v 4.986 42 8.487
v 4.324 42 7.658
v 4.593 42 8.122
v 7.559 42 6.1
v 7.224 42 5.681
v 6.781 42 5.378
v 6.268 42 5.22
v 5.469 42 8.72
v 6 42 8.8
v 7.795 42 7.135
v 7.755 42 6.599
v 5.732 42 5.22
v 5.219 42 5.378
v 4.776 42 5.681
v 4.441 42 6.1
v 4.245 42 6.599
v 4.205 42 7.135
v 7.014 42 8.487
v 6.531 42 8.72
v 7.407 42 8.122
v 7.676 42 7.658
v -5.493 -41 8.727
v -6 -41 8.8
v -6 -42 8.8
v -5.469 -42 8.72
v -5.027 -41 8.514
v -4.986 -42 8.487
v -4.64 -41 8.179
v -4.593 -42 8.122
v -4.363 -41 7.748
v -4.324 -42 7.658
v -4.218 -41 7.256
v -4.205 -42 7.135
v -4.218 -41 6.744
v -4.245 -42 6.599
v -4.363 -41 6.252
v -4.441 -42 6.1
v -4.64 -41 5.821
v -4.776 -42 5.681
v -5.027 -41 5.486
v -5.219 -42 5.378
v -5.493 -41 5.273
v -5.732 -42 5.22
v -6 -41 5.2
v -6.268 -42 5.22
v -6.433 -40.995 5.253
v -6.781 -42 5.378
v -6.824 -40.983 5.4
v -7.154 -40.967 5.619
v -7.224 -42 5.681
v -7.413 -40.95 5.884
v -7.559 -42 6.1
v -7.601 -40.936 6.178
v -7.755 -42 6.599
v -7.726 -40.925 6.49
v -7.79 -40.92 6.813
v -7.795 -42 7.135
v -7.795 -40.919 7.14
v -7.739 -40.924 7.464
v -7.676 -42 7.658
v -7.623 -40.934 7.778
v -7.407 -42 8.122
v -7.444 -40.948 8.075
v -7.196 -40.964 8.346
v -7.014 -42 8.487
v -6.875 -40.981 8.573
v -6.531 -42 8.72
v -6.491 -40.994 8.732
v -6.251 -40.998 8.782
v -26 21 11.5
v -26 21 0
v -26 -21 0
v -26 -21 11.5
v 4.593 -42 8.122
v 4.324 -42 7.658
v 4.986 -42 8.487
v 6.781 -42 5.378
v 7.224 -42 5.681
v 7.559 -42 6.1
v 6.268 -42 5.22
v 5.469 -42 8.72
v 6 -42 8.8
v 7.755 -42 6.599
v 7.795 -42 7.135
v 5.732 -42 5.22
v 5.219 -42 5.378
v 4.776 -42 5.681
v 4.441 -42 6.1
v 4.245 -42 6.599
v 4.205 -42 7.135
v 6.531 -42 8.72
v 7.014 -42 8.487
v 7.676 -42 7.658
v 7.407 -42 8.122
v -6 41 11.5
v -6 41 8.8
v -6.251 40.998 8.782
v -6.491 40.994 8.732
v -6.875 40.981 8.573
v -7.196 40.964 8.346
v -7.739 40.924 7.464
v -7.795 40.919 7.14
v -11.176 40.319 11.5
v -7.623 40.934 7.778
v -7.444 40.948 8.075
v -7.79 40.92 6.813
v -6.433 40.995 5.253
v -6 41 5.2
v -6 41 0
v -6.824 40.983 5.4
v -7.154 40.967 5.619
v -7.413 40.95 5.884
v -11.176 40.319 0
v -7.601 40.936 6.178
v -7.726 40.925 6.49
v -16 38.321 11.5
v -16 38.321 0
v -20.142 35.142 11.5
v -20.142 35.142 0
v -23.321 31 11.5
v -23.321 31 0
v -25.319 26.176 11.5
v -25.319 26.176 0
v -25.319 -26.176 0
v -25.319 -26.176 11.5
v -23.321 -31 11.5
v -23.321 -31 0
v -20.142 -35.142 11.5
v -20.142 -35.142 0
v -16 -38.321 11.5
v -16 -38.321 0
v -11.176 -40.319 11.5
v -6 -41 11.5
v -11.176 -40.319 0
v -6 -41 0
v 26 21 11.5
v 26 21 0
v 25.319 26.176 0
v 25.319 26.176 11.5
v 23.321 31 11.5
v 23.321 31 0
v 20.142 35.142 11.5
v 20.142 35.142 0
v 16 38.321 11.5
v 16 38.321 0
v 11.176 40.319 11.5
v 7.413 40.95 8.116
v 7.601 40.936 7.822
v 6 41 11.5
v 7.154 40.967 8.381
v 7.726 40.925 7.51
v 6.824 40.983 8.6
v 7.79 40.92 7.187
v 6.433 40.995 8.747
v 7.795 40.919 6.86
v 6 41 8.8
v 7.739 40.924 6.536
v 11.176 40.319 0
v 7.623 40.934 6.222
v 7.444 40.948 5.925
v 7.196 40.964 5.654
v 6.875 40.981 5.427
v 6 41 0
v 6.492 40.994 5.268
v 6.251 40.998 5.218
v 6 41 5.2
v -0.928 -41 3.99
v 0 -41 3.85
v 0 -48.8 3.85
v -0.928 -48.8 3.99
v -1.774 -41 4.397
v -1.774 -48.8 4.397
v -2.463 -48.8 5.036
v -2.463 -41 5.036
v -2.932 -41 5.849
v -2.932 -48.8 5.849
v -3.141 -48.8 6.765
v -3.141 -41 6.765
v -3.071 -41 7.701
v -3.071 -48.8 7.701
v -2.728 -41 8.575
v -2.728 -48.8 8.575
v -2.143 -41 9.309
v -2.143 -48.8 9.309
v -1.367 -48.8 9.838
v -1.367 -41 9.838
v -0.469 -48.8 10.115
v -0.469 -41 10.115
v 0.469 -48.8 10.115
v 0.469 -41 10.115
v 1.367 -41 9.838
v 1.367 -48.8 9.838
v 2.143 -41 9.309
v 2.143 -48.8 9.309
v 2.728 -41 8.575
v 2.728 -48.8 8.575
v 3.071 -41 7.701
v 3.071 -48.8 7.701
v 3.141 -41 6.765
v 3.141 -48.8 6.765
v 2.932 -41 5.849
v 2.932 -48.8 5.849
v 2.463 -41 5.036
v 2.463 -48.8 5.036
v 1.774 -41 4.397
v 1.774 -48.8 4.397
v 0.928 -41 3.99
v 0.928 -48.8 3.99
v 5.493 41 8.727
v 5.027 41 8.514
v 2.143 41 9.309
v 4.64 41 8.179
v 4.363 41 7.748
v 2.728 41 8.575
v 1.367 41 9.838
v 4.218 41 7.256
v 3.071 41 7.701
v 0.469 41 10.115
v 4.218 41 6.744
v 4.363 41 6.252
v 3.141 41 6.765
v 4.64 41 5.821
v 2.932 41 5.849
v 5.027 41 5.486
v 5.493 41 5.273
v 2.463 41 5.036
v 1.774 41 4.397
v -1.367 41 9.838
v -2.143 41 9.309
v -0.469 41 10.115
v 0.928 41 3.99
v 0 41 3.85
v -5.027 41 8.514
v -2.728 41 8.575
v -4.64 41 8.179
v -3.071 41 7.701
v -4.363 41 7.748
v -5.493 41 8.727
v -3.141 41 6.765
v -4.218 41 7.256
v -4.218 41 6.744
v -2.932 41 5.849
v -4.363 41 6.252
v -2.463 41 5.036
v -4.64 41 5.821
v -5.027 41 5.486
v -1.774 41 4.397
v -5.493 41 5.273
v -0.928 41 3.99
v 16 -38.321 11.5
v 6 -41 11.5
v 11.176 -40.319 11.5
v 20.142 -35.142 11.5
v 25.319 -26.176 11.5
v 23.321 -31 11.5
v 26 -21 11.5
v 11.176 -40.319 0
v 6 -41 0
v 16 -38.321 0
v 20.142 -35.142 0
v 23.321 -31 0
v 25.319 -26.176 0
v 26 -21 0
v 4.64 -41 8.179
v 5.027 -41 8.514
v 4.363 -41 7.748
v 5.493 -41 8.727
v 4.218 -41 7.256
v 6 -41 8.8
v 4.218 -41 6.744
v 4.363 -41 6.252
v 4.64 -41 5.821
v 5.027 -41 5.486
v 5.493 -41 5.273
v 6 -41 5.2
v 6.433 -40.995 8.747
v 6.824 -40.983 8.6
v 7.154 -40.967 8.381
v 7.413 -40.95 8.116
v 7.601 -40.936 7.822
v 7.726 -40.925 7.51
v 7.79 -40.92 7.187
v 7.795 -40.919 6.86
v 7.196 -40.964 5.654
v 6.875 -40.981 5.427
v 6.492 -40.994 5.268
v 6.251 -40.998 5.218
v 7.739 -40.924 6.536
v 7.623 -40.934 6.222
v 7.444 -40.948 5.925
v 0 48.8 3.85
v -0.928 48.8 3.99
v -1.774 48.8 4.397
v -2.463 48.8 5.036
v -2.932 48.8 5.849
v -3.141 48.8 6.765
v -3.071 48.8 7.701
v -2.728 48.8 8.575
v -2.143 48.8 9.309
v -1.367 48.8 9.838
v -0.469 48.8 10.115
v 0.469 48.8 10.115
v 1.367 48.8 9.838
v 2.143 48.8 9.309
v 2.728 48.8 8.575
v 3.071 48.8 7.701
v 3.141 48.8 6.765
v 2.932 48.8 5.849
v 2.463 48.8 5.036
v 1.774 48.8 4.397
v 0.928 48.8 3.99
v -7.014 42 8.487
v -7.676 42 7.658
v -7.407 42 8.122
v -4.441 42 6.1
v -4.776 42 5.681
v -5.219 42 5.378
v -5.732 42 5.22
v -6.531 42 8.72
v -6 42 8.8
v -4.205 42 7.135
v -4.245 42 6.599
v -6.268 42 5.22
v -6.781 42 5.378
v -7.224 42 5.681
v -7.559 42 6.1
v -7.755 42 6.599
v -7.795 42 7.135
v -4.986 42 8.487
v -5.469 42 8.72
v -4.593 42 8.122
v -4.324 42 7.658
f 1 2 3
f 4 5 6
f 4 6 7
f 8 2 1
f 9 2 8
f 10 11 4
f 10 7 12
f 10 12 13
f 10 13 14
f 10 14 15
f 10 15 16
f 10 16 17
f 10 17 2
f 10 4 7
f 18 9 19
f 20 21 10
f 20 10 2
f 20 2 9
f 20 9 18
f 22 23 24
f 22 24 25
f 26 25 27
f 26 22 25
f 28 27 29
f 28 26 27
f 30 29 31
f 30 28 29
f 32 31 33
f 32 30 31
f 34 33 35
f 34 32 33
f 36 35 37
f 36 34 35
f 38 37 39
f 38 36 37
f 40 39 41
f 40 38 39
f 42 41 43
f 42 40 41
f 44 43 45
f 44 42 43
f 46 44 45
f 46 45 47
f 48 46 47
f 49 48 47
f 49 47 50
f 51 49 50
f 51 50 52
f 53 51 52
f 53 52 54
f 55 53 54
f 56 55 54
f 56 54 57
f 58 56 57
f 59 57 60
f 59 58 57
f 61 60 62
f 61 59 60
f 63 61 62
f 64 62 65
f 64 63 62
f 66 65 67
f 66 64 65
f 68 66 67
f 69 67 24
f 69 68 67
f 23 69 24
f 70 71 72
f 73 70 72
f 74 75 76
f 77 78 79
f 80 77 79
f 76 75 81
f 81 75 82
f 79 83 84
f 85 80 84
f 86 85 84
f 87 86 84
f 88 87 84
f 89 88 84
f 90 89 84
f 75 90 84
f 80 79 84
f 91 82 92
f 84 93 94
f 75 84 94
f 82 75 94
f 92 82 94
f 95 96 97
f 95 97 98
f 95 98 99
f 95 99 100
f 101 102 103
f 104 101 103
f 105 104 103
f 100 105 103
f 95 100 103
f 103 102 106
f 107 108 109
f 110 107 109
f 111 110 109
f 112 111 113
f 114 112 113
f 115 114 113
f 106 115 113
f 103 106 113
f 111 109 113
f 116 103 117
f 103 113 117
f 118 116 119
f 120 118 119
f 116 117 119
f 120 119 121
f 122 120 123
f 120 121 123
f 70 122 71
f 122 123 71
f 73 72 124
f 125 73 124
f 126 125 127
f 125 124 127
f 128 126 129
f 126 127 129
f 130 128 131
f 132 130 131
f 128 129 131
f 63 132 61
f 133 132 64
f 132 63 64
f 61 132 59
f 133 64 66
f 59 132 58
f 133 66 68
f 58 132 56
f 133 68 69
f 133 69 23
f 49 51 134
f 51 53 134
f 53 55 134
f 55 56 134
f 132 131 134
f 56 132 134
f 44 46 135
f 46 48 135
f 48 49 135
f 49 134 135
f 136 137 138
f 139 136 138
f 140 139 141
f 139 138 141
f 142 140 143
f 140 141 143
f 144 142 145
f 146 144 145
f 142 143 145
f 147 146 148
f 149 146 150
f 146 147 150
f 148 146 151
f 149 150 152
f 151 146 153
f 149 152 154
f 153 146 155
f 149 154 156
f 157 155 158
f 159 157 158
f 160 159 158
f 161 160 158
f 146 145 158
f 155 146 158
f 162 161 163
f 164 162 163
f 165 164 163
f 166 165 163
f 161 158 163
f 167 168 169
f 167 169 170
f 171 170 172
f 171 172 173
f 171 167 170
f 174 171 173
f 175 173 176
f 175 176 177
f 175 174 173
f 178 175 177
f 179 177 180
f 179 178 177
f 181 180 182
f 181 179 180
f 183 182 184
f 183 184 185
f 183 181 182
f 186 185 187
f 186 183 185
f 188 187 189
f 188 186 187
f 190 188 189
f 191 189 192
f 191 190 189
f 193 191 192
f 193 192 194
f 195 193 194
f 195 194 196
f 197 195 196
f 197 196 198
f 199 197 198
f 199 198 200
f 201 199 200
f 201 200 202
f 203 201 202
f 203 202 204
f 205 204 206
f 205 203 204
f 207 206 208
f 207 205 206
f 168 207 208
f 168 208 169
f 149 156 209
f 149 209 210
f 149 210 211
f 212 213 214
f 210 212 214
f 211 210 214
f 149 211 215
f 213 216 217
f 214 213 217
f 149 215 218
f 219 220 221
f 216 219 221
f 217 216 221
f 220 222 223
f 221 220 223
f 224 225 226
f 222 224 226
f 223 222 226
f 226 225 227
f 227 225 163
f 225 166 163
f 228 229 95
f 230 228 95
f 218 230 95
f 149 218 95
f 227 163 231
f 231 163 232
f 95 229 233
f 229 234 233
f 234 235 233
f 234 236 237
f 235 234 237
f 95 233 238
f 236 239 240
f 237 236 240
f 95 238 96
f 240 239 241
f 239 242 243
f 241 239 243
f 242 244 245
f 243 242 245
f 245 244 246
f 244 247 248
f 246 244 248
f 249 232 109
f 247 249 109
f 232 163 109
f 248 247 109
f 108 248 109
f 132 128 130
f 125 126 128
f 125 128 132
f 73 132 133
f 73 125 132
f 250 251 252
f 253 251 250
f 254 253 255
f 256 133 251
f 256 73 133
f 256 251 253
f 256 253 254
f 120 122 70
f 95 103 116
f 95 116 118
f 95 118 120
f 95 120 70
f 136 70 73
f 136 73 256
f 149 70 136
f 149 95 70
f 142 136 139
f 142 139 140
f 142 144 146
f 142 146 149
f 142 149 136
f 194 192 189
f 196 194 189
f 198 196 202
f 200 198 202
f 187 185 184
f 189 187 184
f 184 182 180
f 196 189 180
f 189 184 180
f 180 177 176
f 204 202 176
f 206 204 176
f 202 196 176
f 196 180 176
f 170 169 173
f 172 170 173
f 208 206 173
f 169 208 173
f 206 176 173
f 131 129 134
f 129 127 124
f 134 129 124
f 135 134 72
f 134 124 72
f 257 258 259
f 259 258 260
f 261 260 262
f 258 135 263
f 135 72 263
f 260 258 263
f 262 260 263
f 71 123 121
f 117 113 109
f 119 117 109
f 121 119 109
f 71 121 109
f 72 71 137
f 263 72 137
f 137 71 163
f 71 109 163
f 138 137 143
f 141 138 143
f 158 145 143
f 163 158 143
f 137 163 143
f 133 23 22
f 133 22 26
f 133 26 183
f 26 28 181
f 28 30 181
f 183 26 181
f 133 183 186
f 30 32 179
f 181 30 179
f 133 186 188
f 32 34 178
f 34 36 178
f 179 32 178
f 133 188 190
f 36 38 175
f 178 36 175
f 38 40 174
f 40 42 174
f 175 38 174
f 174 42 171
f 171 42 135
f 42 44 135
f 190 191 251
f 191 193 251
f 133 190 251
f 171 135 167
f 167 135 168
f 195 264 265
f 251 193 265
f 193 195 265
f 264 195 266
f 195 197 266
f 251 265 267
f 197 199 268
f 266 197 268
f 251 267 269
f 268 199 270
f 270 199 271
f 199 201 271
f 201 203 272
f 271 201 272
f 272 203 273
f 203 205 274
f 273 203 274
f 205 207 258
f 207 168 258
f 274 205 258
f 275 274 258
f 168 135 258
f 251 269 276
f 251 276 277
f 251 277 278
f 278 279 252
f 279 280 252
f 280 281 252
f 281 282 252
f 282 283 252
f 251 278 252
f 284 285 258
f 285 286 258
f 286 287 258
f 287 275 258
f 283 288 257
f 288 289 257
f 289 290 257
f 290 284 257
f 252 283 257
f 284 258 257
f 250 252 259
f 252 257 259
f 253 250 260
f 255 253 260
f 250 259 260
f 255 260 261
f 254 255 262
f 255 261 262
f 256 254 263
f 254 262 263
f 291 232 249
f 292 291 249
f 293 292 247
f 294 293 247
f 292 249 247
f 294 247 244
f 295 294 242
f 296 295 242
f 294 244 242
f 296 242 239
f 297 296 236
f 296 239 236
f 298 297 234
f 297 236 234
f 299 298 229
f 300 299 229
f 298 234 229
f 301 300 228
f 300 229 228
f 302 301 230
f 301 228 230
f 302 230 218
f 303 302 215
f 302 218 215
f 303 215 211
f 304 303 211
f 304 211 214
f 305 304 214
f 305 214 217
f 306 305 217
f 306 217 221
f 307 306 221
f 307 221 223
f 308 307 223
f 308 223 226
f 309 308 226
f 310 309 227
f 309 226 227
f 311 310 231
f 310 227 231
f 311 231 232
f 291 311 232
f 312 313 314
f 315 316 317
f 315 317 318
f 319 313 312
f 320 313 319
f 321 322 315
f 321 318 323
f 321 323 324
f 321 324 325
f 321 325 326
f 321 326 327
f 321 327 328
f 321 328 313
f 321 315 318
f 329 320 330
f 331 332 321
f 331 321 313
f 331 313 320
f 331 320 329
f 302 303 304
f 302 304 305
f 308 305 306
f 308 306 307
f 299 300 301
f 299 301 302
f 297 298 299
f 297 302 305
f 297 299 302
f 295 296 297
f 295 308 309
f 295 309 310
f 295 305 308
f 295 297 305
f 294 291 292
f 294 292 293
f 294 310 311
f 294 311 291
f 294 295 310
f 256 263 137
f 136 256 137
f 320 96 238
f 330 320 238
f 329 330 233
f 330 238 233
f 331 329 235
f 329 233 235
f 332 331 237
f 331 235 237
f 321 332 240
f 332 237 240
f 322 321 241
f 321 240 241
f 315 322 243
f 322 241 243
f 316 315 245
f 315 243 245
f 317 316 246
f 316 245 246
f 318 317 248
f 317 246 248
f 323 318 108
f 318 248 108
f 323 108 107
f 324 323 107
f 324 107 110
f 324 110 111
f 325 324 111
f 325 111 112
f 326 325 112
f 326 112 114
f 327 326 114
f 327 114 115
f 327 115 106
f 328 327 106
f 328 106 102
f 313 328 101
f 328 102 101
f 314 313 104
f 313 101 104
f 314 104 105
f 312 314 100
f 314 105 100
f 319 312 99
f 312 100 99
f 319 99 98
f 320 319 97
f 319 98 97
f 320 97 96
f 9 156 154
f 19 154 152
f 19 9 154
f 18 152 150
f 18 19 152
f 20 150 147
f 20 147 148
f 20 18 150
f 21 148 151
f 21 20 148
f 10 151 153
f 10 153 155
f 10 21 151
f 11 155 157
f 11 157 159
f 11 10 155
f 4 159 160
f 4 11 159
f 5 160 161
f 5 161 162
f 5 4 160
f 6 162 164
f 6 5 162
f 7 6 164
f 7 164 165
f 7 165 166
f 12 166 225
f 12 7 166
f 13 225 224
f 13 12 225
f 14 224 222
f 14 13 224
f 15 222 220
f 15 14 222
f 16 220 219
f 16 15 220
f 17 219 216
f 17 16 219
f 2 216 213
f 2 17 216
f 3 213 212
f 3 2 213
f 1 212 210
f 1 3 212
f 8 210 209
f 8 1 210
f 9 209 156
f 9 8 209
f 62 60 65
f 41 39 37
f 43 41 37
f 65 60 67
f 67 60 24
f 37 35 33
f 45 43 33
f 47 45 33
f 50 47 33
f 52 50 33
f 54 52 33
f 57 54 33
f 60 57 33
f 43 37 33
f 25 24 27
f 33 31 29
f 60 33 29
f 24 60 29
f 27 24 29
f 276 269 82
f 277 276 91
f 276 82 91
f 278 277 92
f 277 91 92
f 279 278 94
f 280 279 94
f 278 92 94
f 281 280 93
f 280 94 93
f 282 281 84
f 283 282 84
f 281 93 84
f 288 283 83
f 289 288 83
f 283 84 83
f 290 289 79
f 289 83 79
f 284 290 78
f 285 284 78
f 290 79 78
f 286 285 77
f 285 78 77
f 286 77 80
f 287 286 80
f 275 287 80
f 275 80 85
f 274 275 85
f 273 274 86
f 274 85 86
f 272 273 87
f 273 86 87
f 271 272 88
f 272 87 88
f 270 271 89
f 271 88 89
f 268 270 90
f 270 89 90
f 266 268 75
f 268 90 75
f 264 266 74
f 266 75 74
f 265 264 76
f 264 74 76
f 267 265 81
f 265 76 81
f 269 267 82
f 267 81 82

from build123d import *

# Parameters (mm, degrees)
BOSS_EXTRUDE1_DEPTH = 11.5
SKETCH2_R           = 3.15
BOSS_EXTRUDE2_DEPTH = 7.8
SKETCH3_R           = 1.8
BOSS_EXTRUDE3_DEPTH = 1


with BuildPart() as part:
    # Sketch1 → Boss-Extrude1 (new body)
    with BuildSketch(Plane.XY):
        with BuildLine():
            Line((-26, 21), (-26, -21))
            ThreePointArc((-26, -21), (-20.142135624, -35.142135624), (-6, -41))
            Line((-6, -41), (6, -41))
            ThreePointArc((6, -41), (20.142135624, -35.142135624), (26, -21))
            Line((26, -21), (26, 21))
            ThreePointArc((26, 21), (20.142135624, 35.142135624), (6, 41))
            Line((6, 41), (-6, 41))
            ThreePointArc((-6, 41), (-20.142135624, 35.142135624), (-26, 21))
        make_face()
    extrude(amount=BOSS_EXTRUDE1_DEPTH)

    # Sketch2 → Boss-Extrude2 (add)
    with BuildSketch(Plane(origin=(0, 41, 0), x_dir=(1, 0, 0), z_dir=(0, 1, 0))):
        with Locations(Location((0, -7, 0), (0, 0, 90))):
            Circle(SKETCH2_R)
    boss_extrude2 = extrude(amount=BOSS_EXTRUDE2_DEPTH)

    # Sketch3 → Boss-Extrude3 (add, symmetric)
    with BuildSketch(Plane(origin=(0, 41, 0), x_dir=(1, 0, 0), z_dir=(0, 1, 0))):
        with Locations(Location((-6, -7, 0), (0, 0, 270))):
            Circle(SKETCH3_R)
        with Locations(Location((6, -7, 0), (0, 0, 270))):
            Circle(SKETCH3_R)
    boss_extrude3 = extrude(amount=BOSS_EXTRUDE3_DEPTH, both=True)

    # Mirror1: Boss-Extrude2, Boss-Extrude3 across plane
    add(boss_extrude2.mirror(Plane.ZX))
    add(boss_extrude3.mirror(Plane.ZX))


solid = part.part
